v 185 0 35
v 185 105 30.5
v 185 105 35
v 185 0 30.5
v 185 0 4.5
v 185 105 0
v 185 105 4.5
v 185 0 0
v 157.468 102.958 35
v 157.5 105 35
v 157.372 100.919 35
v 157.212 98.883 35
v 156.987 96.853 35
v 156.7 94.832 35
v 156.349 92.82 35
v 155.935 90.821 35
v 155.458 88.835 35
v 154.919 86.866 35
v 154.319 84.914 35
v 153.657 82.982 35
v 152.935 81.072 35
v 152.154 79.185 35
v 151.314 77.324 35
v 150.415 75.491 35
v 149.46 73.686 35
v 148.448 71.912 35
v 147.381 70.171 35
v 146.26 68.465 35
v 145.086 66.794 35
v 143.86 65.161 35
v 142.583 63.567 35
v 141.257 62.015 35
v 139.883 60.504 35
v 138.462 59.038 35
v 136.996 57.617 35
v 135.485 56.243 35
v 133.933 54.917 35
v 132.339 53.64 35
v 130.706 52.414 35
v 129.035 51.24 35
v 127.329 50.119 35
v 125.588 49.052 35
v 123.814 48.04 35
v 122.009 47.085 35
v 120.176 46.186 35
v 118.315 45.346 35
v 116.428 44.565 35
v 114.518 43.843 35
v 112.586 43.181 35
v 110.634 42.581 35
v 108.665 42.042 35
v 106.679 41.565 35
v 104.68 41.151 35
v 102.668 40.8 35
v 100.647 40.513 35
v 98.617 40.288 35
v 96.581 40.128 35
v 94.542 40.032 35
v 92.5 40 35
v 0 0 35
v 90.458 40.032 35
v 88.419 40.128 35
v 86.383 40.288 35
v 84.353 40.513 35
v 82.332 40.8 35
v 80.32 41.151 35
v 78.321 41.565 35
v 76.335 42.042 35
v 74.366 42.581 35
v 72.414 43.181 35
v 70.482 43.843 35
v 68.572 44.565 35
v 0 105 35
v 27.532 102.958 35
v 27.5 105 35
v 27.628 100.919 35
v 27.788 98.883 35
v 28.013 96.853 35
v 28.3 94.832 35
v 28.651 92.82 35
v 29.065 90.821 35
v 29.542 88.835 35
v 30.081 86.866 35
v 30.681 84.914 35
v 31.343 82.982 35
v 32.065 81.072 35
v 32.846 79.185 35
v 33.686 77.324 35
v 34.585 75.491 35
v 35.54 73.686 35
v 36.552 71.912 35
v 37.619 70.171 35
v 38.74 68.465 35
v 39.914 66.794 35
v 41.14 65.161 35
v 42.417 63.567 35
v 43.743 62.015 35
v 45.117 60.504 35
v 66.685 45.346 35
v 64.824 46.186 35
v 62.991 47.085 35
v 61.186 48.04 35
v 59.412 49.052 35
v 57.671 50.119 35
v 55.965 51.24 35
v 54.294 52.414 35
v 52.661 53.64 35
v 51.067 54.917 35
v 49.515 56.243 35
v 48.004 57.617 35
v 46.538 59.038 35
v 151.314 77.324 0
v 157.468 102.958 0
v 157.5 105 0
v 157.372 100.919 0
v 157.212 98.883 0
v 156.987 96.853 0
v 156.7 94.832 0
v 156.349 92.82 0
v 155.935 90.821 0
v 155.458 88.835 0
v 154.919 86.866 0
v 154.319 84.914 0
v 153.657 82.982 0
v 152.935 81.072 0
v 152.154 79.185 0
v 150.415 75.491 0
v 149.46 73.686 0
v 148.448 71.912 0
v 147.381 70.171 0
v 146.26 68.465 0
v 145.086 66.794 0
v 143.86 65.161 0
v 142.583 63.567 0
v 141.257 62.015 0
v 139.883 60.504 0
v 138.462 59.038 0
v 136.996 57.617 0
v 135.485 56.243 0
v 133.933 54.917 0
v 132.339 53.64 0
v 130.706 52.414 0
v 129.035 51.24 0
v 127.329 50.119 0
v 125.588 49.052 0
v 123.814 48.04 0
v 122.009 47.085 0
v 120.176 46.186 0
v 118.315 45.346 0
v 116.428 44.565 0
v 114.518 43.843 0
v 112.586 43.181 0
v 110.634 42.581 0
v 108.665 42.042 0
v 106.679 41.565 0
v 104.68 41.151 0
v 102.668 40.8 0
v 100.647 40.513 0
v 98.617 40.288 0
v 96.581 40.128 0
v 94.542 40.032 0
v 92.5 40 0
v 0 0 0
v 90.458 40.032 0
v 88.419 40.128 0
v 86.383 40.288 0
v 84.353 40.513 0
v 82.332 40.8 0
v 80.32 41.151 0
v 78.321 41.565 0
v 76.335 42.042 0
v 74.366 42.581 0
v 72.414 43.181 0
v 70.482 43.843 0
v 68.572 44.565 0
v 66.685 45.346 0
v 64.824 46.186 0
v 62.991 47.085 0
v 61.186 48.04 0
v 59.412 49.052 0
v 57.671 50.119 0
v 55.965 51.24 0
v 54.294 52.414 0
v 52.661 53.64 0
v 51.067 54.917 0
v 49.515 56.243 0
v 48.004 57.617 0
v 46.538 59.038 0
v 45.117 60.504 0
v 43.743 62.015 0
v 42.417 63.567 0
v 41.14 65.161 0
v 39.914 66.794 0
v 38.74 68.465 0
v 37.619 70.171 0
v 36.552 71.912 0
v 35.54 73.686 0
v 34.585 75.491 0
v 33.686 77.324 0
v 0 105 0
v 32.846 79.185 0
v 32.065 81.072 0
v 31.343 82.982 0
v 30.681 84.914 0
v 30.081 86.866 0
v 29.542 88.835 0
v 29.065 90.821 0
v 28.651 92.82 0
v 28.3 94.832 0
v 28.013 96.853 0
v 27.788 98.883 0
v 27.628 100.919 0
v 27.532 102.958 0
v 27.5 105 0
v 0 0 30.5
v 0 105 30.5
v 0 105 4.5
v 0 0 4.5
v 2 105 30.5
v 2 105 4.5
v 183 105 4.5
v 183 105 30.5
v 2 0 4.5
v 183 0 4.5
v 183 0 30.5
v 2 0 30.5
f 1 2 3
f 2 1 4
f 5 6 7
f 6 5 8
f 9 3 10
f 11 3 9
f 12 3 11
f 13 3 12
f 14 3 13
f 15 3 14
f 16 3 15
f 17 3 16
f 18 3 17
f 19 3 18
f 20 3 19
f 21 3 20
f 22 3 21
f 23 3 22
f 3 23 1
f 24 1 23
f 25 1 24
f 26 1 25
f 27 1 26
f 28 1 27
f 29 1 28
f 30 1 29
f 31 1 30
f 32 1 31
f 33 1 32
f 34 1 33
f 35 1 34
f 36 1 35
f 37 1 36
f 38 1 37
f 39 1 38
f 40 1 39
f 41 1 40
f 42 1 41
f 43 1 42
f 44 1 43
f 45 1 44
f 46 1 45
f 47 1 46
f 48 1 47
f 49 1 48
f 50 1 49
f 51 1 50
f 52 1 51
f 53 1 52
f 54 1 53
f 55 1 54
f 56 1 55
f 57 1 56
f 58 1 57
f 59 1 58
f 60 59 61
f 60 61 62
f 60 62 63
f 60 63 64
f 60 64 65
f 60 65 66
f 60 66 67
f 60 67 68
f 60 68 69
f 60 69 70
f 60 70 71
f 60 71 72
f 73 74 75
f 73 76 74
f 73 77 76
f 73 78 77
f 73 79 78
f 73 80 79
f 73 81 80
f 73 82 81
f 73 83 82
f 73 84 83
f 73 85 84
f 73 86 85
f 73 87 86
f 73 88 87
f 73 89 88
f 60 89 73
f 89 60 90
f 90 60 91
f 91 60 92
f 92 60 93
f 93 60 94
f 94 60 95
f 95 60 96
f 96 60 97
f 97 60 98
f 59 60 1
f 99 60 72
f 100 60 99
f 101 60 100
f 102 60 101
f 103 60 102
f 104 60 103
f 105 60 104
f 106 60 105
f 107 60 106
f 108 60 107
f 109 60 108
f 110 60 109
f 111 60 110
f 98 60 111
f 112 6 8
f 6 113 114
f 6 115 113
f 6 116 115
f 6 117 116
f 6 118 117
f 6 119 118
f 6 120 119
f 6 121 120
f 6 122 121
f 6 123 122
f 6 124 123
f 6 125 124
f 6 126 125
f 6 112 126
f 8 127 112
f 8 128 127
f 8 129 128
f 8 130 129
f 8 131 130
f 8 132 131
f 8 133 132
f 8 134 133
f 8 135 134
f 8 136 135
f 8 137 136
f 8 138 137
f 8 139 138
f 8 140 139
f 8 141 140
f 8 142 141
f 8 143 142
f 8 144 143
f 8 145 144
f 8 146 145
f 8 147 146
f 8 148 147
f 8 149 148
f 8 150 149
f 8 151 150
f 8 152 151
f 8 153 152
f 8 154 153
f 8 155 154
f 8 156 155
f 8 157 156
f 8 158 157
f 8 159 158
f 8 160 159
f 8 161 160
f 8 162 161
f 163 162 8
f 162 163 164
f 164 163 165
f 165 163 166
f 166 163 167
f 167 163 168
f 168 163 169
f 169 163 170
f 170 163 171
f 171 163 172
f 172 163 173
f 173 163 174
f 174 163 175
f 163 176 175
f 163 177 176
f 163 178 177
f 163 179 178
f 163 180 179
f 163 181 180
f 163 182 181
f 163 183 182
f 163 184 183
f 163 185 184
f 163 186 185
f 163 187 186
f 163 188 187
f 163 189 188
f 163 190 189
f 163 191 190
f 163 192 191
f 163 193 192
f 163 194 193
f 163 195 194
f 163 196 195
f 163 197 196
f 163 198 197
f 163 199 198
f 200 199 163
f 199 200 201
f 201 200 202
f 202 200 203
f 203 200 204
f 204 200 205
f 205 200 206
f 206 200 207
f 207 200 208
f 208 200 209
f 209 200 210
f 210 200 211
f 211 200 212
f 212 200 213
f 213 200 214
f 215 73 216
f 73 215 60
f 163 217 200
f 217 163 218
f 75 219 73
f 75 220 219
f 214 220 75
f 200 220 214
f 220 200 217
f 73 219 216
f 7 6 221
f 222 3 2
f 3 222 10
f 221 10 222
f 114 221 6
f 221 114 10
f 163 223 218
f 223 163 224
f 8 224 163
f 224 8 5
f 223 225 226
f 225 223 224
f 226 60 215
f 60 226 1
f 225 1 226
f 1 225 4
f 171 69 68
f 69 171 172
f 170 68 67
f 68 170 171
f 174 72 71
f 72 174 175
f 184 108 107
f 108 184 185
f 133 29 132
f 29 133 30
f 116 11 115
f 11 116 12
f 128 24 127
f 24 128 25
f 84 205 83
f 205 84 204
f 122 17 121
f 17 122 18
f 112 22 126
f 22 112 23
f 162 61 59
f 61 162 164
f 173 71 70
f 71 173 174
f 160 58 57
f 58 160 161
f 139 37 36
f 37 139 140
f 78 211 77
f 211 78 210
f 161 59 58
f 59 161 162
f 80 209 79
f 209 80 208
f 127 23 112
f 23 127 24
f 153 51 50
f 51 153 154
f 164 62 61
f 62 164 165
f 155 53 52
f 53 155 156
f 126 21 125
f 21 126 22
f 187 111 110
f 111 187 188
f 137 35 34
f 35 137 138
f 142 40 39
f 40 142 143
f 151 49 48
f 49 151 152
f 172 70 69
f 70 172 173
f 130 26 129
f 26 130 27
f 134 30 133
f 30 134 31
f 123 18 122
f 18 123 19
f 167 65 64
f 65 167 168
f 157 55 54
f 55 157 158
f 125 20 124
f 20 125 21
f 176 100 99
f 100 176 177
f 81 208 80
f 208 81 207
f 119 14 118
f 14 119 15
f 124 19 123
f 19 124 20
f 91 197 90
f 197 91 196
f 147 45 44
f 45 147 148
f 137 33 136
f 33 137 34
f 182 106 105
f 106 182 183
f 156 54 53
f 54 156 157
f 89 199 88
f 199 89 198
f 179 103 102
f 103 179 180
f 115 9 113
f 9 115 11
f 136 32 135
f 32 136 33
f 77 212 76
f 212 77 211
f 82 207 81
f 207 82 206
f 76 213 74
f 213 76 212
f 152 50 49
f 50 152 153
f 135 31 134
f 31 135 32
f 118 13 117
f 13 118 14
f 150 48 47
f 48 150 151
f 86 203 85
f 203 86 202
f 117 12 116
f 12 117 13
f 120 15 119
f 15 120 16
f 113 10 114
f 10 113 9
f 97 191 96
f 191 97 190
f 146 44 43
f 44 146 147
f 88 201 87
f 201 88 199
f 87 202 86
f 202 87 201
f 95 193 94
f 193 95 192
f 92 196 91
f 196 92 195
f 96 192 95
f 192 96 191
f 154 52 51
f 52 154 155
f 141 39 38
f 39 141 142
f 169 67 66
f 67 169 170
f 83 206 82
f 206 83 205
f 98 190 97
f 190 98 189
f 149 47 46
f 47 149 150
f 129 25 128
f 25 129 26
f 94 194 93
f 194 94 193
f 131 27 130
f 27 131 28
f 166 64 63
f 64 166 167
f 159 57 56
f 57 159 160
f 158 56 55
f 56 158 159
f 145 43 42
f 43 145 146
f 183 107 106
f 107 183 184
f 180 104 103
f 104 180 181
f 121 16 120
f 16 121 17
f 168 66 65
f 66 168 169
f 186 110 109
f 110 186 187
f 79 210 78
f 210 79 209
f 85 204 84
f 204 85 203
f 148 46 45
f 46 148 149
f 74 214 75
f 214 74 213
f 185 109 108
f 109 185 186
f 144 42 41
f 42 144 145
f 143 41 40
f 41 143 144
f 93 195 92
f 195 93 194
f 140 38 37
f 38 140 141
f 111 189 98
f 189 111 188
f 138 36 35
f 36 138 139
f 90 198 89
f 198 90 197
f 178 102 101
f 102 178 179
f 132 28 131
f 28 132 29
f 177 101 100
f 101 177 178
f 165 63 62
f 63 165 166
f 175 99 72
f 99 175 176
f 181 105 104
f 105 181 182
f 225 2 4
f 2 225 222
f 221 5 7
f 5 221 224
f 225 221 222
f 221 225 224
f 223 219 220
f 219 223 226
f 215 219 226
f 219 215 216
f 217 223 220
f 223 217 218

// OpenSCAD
$fn=200;


/* Version 01 
 * pumpholder_eurobox_mesh_tie-down_center.stl
 *
 * pumpholder for eurobox (60x40x32)
 * https://www.bauhaus.info/euroboxen/bauhaus-eurobehaelter/p/10753216
 * with mesh sides 
 * and a centered tie-down guide-slot
 */

difference()
{
    cube([185,105,35]);
    translate([92.5,105,-5]) cylinder(d=130,h=45);
    color("red") translate([183,00,4.5]) cube([10,170,26]);
    color("red") translate([-8,00,4.5]) cube([10,170,26]);
}
